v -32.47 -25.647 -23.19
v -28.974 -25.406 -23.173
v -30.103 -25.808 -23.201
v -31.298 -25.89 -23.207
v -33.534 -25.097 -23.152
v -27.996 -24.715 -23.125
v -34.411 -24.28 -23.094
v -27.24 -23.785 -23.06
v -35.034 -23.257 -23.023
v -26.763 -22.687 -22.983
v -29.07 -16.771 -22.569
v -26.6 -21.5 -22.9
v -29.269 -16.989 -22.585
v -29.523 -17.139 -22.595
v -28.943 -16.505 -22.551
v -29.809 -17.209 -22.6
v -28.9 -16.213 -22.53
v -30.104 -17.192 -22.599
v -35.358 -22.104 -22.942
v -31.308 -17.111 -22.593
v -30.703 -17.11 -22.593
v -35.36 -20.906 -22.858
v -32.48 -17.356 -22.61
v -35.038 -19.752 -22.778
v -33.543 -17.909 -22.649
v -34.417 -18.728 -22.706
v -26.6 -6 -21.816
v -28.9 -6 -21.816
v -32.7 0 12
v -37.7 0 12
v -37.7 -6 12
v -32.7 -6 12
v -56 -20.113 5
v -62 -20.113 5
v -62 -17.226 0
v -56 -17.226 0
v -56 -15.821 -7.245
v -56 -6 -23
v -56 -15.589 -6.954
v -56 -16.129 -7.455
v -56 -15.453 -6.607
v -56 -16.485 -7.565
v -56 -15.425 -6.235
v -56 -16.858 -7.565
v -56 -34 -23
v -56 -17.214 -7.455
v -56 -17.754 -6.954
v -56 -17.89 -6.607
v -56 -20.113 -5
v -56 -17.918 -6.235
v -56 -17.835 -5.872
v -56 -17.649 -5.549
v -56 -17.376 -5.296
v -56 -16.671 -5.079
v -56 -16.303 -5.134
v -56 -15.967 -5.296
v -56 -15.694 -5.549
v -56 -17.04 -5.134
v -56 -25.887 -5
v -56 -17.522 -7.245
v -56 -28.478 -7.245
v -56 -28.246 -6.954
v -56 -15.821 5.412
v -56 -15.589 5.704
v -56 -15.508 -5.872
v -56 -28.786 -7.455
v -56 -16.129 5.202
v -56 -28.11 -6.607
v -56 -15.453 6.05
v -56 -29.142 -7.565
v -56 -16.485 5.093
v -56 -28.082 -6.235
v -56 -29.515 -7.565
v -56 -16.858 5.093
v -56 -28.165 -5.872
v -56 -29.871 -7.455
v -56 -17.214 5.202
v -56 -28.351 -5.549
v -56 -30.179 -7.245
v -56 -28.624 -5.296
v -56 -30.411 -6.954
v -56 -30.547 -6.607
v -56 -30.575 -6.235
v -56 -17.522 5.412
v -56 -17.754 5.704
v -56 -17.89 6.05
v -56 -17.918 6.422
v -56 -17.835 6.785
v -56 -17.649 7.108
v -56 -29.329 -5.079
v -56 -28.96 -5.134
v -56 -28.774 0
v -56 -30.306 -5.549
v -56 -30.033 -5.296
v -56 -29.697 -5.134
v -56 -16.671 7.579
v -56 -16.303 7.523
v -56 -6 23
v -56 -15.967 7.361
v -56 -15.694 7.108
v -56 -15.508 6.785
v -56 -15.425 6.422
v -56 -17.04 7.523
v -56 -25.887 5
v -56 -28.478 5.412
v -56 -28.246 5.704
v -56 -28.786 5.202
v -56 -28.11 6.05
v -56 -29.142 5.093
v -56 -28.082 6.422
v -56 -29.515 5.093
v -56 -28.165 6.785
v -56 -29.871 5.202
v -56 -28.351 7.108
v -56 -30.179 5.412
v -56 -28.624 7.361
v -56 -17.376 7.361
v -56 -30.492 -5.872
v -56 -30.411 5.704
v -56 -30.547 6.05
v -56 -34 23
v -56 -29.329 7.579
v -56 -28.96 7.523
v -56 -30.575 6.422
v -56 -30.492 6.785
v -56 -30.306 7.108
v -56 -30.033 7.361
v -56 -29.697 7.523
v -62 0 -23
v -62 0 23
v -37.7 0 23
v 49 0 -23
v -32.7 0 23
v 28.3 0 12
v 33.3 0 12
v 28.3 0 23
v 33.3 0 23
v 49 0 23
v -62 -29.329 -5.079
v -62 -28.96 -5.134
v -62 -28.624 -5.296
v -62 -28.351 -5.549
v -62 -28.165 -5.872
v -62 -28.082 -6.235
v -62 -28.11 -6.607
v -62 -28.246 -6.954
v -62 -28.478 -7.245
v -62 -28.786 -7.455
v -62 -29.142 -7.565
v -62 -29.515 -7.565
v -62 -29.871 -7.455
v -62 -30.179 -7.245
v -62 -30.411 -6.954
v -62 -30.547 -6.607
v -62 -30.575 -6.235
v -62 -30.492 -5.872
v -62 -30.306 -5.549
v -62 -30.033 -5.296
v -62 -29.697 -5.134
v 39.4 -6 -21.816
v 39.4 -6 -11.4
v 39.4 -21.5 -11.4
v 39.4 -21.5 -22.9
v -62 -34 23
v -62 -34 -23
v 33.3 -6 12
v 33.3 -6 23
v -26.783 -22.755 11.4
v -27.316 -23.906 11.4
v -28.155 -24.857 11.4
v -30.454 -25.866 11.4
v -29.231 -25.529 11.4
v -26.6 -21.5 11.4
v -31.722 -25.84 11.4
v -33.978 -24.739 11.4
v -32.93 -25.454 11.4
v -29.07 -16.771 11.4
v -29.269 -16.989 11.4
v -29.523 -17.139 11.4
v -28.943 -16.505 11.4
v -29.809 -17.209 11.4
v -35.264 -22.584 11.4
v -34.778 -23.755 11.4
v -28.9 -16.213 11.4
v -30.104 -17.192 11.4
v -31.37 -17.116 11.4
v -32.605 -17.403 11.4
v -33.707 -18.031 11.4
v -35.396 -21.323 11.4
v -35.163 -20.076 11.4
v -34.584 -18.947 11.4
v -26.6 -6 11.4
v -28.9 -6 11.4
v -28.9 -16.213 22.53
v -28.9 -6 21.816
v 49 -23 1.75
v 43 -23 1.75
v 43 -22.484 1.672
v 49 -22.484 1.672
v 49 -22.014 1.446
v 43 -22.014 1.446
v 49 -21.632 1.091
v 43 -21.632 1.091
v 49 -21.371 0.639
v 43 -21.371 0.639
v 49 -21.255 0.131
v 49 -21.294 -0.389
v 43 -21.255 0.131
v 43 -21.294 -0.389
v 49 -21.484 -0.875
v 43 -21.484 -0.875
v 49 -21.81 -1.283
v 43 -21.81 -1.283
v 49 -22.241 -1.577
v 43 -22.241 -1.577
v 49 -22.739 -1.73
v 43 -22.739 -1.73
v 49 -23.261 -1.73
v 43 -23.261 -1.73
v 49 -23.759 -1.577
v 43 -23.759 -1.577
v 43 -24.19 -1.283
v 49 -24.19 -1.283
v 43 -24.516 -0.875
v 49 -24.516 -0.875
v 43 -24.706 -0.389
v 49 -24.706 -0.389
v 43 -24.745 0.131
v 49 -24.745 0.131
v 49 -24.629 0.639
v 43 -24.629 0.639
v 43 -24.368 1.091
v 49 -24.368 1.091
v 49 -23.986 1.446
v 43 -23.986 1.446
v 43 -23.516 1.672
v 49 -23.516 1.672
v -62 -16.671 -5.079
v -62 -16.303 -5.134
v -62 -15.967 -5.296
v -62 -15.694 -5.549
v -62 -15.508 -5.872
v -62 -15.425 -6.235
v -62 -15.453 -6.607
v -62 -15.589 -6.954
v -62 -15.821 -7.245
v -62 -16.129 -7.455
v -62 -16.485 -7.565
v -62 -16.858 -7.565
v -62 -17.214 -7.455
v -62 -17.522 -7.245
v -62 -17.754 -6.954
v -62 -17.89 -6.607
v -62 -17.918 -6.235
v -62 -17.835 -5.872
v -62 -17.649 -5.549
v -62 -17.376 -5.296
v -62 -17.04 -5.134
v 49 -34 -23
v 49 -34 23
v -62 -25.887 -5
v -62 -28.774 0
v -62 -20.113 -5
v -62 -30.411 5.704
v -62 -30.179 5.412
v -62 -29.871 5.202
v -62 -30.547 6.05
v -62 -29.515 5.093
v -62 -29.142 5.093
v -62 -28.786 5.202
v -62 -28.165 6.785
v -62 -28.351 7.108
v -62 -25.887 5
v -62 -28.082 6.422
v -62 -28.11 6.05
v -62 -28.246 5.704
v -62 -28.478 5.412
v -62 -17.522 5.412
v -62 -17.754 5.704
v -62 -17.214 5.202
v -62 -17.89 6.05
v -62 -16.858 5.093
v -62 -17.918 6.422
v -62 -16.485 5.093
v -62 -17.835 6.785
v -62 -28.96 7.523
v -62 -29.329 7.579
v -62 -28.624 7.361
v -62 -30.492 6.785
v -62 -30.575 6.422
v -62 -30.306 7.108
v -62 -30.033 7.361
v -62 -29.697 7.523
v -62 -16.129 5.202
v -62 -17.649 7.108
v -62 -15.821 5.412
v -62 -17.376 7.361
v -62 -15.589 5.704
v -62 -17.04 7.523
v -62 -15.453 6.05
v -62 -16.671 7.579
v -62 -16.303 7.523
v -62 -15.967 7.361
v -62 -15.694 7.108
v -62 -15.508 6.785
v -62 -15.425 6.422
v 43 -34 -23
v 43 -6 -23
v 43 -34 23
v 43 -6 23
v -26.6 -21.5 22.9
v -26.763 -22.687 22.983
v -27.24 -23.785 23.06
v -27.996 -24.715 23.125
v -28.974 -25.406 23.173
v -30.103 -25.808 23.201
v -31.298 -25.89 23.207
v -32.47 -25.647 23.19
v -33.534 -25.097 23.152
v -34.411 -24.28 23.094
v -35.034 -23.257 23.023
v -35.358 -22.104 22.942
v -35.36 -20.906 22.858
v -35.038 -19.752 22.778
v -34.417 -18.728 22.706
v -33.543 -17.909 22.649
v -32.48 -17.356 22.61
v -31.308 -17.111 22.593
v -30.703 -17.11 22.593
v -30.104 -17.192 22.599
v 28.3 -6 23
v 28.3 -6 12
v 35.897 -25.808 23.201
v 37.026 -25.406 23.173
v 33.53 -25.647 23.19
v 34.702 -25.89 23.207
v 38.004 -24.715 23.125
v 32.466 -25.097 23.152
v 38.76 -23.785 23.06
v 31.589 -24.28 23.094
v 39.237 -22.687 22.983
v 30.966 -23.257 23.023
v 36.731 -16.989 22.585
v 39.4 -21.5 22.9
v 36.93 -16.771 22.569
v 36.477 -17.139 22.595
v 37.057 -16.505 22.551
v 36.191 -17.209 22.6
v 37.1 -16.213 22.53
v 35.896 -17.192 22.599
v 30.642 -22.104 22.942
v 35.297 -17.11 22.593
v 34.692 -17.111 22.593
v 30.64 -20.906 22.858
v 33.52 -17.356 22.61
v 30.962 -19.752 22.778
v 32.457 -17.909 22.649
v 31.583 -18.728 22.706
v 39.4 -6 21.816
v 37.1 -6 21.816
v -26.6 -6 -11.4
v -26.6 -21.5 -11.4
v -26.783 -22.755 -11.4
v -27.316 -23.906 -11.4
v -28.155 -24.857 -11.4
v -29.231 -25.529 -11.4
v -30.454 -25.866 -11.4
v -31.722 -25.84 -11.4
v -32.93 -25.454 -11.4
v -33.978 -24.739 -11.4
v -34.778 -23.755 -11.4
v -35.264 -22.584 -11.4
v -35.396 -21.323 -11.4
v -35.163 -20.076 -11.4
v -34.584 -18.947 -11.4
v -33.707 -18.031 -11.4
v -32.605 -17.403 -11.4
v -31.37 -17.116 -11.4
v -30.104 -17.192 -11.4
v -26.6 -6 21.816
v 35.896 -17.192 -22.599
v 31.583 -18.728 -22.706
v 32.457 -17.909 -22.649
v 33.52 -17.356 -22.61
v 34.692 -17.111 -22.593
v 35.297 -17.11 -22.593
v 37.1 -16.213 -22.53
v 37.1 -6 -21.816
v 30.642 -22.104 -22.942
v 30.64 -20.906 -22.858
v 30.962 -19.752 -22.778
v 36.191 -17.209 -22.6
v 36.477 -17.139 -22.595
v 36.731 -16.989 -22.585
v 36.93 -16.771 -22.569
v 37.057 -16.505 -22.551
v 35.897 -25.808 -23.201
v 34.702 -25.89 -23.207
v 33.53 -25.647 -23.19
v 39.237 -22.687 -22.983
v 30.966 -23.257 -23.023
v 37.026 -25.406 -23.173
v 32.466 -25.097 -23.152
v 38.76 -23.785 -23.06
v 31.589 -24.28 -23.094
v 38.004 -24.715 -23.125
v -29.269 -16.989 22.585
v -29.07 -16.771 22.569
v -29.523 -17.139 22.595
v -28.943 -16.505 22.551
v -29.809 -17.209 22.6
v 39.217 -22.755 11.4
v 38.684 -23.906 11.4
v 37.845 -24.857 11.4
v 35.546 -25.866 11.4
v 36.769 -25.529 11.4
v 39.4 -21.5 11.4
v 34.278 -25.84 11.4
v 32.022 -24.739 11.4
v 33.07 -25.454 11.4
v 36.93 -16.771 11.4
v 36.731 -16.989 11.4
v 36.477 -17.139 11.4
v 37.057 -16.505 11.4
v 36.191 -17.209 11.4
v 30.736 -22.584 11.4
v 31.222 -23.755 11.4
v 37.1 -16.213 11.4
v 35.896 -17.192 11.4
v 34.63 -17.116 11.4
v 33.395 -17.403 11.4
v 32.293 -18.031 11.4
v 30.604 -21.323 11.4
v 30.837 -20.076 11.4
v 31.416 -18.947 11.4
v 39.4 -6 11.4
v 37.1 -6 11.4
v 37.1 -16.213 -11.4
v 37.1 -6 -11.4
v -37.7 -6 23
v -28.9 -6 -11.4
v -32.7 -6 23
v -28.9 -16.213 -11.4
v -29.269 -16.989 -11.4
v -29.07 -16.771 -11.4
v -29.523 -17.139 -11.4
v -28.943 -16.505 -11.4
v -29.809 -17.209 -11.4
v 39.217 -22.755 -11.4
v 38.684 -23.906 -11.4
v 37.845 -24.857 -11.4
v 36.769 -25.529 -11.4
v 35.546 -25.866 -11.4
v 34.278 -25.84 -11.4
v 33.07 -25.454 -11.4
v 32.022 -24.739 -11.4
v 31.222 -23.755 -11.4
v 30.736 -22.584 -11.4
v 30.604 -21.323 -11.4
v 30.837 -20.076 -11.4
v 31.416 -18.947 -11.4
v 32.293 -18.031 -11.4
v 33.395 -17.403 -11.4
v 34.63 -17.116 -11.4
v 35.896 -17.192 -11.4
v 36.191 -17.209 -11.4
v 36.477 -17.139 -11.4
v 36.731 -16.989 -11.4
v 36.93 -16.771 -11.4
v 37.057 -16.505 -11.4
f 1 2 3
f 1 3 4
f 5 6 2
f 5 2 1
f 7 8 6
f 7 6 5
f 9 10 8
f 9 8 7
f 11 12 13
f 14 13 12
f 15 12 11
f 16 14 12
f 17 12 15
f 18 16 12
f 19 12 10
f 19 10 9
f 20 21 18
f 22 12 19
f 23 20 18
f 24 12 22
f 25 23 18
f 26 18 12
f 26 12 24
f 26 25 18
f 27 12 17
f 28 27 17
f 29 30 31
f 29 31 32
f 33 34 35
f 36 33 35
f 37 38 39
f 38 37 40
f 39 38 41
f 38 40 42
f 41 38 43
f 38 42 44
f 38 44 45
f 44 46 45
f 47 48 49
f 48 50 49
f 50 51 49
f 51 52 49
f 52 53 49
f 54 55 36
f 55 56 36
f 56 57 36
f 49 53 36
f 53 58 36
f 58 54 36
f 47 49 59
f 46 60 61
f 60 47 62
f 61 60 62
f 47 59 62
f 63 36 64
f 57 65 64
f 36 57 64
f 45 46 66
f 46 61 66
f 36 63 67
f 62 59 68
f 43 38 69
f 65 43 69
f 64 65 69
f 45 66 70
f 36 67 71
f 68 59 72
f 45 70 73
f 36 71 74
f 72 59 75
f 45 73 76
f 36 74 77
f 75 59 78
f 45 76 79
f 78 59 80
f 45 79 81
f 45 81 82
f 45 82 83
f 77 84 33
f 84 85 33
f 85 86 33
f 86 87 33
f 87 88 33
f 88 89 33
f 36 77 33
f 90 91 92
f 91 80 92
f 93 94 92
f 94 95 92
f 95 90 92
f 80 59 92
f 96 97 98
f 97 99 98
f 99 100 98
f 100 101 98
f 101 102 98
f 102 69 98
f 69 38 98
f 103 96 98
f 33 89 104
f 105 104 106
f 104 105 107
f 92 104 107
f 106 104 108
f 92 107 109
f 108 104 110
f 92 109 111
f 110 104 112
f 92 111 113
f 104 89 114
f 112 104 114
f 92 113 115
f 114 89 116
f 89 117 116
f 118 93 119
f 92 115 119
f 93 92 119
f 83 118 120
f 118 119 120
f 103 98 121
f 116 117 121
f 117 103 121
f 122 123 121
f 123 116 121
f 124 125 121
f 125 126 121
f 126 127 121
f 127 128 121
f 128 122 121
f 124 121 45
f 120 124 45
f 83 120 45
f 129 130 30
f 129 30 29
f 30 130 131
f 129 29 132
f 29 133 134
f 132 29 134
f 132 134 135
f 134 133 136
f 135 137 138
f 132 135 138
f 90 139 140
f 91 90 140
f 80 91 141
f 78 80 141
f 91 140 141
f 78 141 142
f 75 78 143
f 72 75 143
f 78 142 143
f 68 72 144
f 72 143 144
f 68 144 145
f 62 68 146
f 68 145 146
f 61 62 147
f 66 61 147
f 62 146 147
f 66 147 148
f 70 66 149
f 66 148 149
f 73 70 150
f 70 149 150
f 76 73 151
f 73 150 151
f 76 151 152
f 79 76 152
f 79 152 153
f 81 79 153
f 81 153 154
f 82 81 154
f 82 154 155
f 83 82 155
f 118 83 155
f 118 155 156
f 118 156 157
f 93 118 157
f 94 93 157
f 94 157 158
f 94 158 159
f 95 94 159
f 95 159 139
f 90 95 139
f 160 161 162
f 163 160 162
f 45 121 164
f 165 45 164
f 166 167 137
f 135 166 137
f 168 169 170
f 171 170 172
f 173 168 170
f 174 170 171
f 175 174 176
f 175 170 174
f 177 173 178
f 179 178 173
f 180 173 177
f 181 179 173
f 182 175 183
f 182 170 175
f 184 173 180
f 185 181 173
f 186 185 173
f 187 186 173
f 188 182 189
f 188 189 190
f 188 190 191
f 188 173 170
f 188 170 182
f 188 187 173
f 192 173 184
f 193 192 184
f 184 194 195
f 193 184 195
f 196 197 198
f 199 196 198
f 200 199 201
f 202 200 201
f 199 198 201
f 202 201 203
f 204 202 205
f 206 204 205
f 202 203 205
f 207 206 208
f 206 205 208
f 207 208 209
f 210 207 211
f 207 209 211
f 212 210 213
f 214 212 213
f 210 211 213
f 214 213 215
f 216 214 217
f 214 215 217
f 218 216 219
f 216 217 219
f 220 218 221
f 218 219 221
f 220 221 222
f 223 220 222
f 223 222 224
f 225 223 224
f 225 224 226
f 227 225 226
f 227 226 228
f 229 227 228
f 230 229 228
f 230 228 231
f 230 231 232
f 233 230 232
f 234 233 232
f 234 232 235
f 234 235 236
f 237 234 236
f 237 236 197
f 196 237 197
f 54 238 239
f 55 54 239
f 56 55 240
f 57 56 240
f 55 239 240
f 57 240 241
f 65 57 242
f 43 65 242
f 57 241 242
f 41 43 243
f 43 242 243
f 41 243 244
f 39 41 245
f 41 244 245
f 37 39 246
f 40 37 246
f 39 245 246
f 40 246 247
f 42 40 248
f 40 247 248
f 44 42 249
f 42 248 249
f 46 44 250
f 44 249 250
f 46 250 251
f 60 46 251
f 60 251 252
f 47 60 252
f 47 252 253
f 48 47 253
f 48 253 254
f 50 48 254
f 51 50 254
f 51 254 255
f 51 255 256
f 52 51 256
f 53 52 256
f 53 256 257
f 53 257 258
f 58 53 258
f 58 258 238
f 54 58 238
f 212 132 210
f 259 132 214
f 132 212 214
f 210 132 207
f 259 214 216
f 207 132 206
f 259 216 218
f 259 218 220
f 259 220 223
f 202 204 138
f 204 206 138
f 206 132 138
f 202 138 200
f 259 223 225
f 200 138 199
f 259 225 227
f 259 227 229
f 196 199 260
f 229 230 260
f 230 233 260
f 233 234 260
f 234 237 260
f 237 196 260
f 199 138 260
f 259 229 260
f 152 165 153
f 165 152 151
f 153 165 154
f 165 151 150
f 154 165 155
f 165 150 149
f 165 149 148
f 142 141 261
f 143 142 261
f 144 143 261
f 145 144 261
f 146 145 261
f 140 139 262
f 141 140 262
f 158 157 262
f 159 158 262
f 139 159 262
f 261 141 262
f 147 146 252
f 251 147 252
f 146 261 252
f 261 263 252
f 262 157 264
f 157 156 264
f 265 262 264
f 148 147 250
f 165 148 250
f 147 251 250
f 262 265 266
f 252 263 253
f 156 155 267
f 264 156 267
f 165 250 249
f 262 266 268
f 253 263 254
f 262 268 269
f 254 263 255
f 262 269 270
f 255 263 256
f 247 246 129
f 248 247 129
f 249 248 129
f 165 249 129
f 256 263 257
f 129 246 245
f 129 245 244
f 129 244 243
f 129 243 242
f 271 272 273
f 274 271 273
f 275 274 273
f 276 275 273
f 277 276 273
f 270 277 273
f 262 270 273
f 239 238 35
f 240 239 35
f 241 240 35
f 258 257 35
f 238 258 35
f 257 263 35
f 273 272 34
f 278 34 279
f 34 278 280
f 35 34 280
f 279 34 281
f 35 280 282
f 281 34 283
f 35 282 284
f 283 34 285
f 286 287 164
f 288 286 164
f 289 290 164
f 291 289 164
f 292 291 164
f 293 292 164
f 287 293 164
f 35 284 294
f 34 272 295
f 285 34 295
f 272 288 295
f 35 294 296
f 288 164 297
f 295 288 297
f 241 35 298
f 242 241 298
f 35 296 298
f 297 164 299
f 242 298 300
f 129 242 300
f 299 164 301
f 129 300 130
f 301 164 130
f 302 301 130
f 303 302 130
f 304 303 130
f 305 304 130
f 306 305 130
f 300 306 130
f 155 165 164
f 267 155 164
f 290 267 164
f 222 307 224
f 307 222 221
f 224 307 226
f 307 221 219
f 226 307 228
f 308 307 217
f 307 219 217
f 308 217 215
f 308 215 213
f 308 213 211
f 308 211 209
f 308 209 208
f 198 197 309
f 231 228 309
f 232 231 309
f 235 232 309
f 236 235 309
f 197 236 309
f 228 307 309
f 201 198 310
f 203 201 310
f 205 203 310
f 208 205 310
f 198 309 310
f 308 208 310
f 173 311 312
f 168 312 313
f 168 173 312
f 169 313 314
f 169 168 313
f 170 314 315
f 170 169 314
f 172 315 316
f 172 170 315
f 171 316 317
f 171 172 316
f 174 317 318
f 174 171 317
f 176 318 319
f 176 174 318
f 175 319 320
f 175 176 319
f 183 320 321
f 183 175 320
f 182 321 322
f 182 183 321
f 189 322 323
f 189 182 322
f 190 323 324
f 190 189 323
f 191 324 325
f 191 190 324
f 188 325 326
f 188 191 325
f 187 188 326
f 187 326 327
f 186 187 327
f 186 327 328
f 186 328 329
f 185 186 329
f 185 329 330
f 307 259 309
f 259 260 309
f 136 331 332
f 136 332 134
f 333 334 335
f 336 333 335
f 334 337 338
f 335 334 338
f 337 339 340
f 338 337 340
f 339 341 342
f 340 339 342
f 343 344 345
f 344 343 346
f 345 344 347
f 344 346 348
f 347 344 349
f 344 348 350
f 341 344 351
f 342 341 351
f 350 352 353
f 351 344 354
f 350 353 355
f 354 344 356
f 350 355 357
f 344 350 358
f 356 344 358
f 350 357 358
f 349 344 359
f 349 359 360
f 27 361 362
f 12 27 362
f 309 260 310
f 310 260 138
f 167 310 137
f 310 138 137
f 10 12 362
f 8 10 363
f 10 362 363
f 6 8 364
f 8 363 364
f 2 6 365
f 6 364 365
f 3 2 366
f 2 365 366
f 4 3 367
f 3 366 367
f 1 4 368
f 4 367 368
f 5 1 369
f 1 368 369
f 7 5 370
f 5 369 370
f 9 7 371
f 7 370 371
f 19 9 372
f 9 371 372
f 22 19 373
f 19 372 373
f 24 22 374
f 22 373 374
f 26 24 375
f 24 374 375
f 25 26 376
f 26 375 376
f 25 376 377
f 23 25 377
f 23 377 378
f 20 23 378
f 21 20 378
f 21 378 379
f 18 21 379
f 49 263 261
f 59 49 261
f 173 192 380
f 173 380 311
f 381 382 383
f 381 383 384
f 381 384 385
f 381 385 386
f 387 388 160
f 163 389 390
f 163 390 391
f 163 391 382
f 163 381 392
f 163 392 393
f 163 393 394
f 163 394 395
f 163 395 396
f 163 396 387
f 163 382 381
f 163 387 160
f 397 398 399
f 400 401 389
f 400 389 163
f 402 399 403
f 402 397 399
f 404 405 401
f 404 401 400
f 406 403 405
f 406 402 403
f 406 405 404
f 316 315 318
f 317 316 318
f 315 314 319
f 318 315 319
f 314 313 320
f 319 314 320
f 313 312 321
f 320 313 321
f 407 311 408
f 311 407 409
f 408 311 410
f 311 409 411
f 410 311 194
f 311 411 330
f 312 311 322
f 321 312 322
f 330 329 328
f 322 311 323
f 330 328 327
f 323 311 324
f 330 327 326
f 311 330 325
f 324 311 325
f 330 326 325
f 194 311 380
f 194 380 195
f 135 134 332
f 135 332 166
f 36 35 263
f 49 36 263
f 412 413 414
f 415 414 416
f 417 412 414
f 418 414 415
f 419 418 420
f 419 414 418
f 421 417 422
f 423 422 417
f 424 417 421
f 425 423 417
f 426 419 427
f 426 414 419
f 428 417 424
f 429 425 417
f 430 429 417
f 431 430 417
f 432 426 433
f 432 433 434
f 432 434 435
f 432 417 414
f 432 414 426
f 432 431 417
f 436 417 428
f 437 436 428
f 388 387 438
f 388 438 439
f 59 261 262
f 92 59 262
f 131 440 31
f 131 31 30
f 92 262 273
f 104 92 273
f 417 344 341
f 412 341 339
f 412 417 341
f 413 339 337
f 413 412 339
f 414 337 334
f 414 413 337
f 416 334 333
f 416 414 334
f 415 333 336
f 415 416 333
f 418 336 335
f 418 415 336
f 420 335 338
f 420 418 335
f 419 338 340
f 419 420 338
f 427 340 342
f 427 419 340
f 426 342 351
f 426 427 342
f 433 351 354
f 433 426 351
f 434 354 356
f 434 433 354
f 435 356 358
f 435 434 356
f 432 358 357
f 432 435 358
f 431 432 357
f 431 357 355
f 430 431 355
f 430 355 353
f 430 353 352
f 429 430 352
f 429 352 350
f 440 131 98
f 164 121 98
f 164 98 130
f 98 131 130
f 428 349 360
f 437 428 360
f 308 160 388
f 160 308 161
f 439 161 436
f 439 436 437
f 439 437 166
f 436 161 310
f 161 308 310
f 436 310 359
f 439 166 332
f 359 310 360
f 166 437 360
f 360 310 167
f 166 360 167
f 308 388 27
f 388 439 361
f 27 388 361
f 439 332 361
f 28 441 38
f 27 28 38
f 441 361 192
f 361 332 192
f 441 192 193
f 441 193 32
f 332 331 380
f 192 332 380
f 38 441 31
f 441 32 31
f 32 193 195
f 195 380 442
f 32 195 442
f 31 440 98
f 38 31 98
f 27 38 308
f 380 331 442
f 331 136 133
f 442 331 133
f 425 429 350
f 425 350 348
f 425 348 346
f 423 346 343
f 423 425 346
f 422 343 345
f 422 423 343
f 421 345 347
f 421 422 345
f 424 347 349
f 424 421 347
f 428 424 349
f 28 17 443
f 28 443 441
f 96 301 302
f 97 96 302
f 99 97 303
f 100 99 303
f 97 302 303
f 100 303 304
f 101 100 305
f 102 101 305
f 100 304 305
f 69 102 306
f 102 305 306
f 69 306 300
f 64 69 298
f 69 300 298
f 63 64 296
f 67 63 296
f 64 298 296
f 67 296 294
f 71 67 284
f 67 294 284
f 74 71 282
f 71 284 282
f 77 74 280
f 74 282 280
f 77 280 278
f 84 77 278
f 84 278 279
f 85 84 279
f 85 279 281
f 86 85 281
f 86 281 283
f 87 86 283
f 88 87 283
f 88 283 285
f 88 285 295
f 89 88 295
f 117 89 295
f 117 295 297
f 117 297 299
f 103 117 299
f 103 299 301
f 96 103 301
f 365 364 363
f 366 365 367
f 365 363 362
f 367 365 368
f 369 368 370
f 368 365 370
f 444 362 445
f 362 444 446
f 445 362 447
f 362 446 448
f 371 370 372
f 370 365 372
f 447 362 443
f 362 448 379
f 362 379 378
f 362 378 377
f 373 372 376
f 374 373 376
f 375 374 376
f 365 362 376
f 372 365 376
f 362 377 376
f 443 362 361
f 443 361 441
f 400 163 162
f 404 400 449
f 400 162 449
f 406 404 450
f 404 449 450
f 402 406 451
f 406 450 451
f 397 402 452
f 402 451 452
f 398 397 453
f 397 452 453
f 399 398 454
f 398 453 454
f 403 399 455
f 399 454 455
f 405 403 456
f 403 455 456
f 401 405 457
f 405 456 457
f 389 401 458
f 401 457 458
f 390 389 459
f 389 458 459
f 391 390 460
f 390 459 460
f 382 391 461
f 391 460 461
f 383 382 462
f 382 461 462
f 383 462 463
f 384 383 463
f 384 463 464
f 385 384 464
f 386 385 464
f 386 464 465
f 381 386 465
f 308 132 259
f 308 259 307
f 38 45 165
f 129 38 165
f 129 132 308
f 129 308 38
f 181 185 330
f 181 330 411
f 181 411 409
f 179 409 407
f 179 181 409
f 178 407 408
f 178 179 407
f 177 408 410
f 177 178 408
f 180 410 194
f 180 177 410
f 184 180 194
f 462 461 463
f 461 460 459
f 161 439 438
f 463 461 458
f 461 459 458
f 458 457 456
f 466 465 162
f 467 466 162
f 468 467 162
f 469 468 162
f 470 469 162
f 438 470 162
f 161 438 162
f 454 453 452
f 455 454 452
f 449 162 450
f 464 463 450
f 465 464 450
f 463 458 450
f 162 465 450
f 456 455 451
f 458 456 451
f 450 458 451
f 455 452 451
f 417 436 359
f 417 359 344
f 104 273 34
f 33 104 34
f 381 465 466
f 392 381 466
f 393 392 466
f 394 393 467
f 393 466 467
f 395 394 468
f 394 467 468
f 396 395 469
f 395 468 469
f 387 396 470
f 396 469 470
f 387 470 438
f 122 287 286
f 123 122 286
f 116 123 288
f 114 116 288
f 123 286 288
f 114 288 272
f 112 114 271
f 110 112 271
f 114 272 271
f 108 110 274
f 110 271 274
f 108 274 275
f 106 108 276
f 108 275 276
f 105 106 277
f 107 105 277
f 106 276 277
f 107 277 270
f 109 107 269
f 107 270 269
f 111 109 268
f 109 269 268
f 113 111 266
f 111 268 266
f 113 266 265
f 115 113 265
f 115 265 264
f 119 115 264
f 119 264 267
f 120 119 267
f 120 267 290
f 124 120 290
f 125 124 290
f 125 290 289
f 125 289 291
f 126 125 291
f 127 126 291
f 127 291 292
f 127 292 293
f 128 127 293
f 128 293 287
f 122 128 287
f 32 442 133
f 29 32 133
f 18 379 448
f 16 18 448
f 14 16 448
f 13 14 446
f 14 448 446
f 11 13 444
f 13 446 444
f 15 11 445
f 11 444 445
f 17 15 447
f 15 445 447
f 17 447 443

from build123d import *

# Parameters (mm, degrees)
BOSS_EXTRUDE1_DEPTH       = 23
CUT_EXTRUDE1_REACH        = 120.347
SKETCH2_R                 = 1.25
CUT_EXTRUDE2_REACH        = 114.739
SKETCH3_R                 = 1.75
BOSS_EXTRUDE2_START       = -11.4
BOSS_EXTRUDE2_DEPTH       = 11.5
LPATTERN1_COUNT           = 2
LPATTERN1_PITCH           = 66
DRAFT1_ANGLE              = 4
MIRROR1_START             = -11.4
MIRROR1_COPY_1_DEPTH      = 11.5
DRAFT1_OF_MIRROR1_2_ANGLE = 4
SKETCH5_W                 = 5
SKETCH5_H                 = 6
CUT_EXTRUDE3_DEPTH        = 11


with BuildPart() as part:
    # Sketch1 → Boss-Extrude1 (new, symmetric)
    with BuildSketch(Plane.XY):
        Polygon((-62, 0), (49, 0), (49, -34), (43, -34), (43, -6), (-56, -6), (-56, -34), (-62, -34), align=None)
    extrude(amount=BOSS_EXTRUDE1_DEPTH, both=True)

    # Sketch2 → Cut-Extrude1 (cut, up to next)
    with BuildSketch(Plane.ZY.offset(62), mode=Mode.PRIVATE) as cut_extrude1_sk1:
        with Locations((-6.328605692, -16.671394308)):
            Circle(SKETCH2_R)
    cut_extrude1_tool1 = extrude(cut_extrude1_sk1.sketch, amount=-CUT_EXTRUDE1_REACH, mode=Mode.PRIVATE) & part.part
    # Sketch2 → Cut-Extrude1 (cut, up to next)
    with BuildSketch(Plane.ZY.offset(62), mode=Mode.PRIVATE) as cut_extrude1_sk2:
        with Locations((6.328605692, -16.671394308)):
            Circle(SKETCH2_R)
    cut_extrude1_tool2 = extrude(cut_extrude1_sk2.sketch, amount=-CUT_EXTRUDE1_REACH, mode=Mode.PRIVATE) & part.part
    # Sketch2 → Cut-Extrude1 (cut, up to next)
    with BuildSketch(Plane.ZY.offset(62), mode=Mode.PRIVATE) as cut_extrude1_sk3:
        with Locations((6.328605692, -29.328605692)):
            Circle(SKETCH2_R)
    cut_extrude1_tool3 = extrude(cut_extrude1_sk3.sketch, amount=-CUT_EXTRUDE1_REACH, mode=Mode.PRIVATE) & part.part
    # Sketch2 → Cut-Extrude1 (cut, up to next)
    with BuildSketch(Plane.ZY.offset(62), mode=Mode.PRIVATE) as cut_extrude1_sk4:
        with Locations((-6.328605692, -29.328605692)):
            Circle(SKETCH2_R)
    cut_extrude1_tool4 = extrude(cut_extrude1_sk4.sketch, amount=-CUT_EXTRUDE1_REACH, mode=Mode.PRIVATE) & part.part
    # Sketch2 → Cut-Extrude1 (cut, up to next)
    with BuildSketch(Plane.ZY.offset(62), mode=Mode.PRIVATE) as cut_extrude1_sk5:
        Polygon((-5, -20.113248654), (-5, -25.886751346), (0, -28.773502692), (5, -25.886751346), (5, -20.113248654), (0, -17.226497308), align=None)
    cut_extrude1_tool5 = extrude(cut_extrude1_sk5.sketch, amount=-CUT_EXTRUDE1_REACH, mode=Mode.PRIVATE) & part.part
    add(cut_extrude1_tool1.solids().sort_by_distance((-62, -16.671394, -6.328606))[0], mode=Mode.SUBTRACT)
    add(cut_extrude1_tool2.solids().sort_by_distance((-62, -16.671394, 6.328606))[0], mode=Mode.SUBTRACT)
    add(cut_extrude1_tool3.solids().sort_by_distance((-62, -29.328606, 6.328606))[0], mode=Mode.SUBTRACT)
    add(cut_extrude1_tool4.solids().sort_by_distance((-62, -29.328606, -6.328606))[0], mode=Mode.SUBTRACT)
    add(cut_extrude1_tool5.solids().sort_by_distance((-62, -23, 0))[0], mode=Mode.SUBTRACT)

    # Sketch3 → Cut-Extrude2 (cut, up to next)
    with BuildSketch(Plane.ZY.offset(-43), mode=Mode.PRIVATE) as cut_extrude2_sk1:
        with Locations((0, -23)):
            Circle(SKETCH3_R)
    cut_extrude2_tool1 = extrude(cut_extrude2_sk1.sketch, amount=-CUT_EXTRUDE2_REACH, mode=Mode.PRIVATE) & part.part
    add(cut_extrude2_tool1.solids().sort_by_distance((43, -23, 0))[0], mode=Mode.SUBTRACT)

    # Sketch4 → Boss-Extrude2 (add)
    with BuildSketch(Plane(origin=(0, 0, 0), x_dir=(-1, 0, 0), z_dir=(0, 0, -1)).offset(BOSS_EXTRUDE2_START)):
        with BuildLine():
            Line((28.9, -16.213224045), (28.9, -6))
            Line((28.9, -6), (26.6, -6))
            Line((26.6, -6), (26.6, -21.5))
            ThreePointArc((26.6, -21.5), (34.4134809, -24.276355191), (30.103703704, -17.192256629))
            ThreePointArc((30.103703704, -17.192256629), (29.269010184, -16.989015158), (28.9, -16.213224045))
        make_face()
    boss_extrude2 = extrude(amount=-BOSS_EXTRUDE2_DEPTH)

    # LPattern1: Boss-Extrude2 ×2
    with Locations(*[(i * LPATTERN1_PITCH, 0, 0) for i in range(1, LPATTERN1_COUNT)]):
        add(boss_extrude2)

    # Draft1
    draft1_faces = [part.faces().sort_by_distance(p)[0] for p in [
        (36.075013094, -18.535245668, 22.9),
        (-29.924986906, -18.535245668, 22.9),
    ]]
    draft(draft1_faces, Plane.ZX.offset(-21.5), DRAFT1_ANGLE)

    # Mirror1: Boss-Extrude2 across plane
    add(boss_extrude2.mirror(Plane.XY))

    # Mirror1 copy 1 sketch → Mirror1 copy 1 (add)
    with BuildSketch(Plane(origin=(66, 0, 0), x_dir=(-1, 0, 0), z_dir=(0, 0, 1)).offset(MIRROR1_START)):
        with BuildLine():
            Line((28.9, 16.213224045), (28.9, 6))
            Line((28.9, 6), (26.6, 6))
            Line((26.6, 6), (26.6, 21.5))
            ThreePointArc((26.6, 21.5), (34.4134809, 24.276355191), (30.103703704, 17.192256629))
            ThreePointArc((30.103703704, 17.192256629), (29.269010184, 16.989015158), (28.9, 16.213224045))
        make_face()
    extrude(amount=-MIRROR1_COPY_1_DEPTH)

    # Draft1 of Mirror1 2
    draft1_of_mirror1_2_faces = [part.faces().sort_by_distance(p)[0] for p in [
        (36.075013094, -18.535245668, -22.9),
        (-29.924986906, -18.535245668, -22.9),
    ]]
    draft(draft1_of_mirror1_2_faces, Plane(origin=(0, -21.5, 0), x_dir=(0, 0, -1), z_dir=(0, 1, 0)), DRAFT1_OF_MIRROR1_2_ANGLE)

    # Sketch5 → Cut-Extrude3 (cut)
    with BuildSketch(Plane.XY.offset(23)):
        with Locations((-35.2, -3)):
            Rectangle(SKETCH5_W, SKETCH5_H)
        with Locations((30.8, -3)):
            Rectangle(SKETCH5_W, SKETCH5_H)
    extrude(amount=-CUT_EXTRUDE3_DEPTH, mode=Mode.SUBTRACT)


solid = part.part
